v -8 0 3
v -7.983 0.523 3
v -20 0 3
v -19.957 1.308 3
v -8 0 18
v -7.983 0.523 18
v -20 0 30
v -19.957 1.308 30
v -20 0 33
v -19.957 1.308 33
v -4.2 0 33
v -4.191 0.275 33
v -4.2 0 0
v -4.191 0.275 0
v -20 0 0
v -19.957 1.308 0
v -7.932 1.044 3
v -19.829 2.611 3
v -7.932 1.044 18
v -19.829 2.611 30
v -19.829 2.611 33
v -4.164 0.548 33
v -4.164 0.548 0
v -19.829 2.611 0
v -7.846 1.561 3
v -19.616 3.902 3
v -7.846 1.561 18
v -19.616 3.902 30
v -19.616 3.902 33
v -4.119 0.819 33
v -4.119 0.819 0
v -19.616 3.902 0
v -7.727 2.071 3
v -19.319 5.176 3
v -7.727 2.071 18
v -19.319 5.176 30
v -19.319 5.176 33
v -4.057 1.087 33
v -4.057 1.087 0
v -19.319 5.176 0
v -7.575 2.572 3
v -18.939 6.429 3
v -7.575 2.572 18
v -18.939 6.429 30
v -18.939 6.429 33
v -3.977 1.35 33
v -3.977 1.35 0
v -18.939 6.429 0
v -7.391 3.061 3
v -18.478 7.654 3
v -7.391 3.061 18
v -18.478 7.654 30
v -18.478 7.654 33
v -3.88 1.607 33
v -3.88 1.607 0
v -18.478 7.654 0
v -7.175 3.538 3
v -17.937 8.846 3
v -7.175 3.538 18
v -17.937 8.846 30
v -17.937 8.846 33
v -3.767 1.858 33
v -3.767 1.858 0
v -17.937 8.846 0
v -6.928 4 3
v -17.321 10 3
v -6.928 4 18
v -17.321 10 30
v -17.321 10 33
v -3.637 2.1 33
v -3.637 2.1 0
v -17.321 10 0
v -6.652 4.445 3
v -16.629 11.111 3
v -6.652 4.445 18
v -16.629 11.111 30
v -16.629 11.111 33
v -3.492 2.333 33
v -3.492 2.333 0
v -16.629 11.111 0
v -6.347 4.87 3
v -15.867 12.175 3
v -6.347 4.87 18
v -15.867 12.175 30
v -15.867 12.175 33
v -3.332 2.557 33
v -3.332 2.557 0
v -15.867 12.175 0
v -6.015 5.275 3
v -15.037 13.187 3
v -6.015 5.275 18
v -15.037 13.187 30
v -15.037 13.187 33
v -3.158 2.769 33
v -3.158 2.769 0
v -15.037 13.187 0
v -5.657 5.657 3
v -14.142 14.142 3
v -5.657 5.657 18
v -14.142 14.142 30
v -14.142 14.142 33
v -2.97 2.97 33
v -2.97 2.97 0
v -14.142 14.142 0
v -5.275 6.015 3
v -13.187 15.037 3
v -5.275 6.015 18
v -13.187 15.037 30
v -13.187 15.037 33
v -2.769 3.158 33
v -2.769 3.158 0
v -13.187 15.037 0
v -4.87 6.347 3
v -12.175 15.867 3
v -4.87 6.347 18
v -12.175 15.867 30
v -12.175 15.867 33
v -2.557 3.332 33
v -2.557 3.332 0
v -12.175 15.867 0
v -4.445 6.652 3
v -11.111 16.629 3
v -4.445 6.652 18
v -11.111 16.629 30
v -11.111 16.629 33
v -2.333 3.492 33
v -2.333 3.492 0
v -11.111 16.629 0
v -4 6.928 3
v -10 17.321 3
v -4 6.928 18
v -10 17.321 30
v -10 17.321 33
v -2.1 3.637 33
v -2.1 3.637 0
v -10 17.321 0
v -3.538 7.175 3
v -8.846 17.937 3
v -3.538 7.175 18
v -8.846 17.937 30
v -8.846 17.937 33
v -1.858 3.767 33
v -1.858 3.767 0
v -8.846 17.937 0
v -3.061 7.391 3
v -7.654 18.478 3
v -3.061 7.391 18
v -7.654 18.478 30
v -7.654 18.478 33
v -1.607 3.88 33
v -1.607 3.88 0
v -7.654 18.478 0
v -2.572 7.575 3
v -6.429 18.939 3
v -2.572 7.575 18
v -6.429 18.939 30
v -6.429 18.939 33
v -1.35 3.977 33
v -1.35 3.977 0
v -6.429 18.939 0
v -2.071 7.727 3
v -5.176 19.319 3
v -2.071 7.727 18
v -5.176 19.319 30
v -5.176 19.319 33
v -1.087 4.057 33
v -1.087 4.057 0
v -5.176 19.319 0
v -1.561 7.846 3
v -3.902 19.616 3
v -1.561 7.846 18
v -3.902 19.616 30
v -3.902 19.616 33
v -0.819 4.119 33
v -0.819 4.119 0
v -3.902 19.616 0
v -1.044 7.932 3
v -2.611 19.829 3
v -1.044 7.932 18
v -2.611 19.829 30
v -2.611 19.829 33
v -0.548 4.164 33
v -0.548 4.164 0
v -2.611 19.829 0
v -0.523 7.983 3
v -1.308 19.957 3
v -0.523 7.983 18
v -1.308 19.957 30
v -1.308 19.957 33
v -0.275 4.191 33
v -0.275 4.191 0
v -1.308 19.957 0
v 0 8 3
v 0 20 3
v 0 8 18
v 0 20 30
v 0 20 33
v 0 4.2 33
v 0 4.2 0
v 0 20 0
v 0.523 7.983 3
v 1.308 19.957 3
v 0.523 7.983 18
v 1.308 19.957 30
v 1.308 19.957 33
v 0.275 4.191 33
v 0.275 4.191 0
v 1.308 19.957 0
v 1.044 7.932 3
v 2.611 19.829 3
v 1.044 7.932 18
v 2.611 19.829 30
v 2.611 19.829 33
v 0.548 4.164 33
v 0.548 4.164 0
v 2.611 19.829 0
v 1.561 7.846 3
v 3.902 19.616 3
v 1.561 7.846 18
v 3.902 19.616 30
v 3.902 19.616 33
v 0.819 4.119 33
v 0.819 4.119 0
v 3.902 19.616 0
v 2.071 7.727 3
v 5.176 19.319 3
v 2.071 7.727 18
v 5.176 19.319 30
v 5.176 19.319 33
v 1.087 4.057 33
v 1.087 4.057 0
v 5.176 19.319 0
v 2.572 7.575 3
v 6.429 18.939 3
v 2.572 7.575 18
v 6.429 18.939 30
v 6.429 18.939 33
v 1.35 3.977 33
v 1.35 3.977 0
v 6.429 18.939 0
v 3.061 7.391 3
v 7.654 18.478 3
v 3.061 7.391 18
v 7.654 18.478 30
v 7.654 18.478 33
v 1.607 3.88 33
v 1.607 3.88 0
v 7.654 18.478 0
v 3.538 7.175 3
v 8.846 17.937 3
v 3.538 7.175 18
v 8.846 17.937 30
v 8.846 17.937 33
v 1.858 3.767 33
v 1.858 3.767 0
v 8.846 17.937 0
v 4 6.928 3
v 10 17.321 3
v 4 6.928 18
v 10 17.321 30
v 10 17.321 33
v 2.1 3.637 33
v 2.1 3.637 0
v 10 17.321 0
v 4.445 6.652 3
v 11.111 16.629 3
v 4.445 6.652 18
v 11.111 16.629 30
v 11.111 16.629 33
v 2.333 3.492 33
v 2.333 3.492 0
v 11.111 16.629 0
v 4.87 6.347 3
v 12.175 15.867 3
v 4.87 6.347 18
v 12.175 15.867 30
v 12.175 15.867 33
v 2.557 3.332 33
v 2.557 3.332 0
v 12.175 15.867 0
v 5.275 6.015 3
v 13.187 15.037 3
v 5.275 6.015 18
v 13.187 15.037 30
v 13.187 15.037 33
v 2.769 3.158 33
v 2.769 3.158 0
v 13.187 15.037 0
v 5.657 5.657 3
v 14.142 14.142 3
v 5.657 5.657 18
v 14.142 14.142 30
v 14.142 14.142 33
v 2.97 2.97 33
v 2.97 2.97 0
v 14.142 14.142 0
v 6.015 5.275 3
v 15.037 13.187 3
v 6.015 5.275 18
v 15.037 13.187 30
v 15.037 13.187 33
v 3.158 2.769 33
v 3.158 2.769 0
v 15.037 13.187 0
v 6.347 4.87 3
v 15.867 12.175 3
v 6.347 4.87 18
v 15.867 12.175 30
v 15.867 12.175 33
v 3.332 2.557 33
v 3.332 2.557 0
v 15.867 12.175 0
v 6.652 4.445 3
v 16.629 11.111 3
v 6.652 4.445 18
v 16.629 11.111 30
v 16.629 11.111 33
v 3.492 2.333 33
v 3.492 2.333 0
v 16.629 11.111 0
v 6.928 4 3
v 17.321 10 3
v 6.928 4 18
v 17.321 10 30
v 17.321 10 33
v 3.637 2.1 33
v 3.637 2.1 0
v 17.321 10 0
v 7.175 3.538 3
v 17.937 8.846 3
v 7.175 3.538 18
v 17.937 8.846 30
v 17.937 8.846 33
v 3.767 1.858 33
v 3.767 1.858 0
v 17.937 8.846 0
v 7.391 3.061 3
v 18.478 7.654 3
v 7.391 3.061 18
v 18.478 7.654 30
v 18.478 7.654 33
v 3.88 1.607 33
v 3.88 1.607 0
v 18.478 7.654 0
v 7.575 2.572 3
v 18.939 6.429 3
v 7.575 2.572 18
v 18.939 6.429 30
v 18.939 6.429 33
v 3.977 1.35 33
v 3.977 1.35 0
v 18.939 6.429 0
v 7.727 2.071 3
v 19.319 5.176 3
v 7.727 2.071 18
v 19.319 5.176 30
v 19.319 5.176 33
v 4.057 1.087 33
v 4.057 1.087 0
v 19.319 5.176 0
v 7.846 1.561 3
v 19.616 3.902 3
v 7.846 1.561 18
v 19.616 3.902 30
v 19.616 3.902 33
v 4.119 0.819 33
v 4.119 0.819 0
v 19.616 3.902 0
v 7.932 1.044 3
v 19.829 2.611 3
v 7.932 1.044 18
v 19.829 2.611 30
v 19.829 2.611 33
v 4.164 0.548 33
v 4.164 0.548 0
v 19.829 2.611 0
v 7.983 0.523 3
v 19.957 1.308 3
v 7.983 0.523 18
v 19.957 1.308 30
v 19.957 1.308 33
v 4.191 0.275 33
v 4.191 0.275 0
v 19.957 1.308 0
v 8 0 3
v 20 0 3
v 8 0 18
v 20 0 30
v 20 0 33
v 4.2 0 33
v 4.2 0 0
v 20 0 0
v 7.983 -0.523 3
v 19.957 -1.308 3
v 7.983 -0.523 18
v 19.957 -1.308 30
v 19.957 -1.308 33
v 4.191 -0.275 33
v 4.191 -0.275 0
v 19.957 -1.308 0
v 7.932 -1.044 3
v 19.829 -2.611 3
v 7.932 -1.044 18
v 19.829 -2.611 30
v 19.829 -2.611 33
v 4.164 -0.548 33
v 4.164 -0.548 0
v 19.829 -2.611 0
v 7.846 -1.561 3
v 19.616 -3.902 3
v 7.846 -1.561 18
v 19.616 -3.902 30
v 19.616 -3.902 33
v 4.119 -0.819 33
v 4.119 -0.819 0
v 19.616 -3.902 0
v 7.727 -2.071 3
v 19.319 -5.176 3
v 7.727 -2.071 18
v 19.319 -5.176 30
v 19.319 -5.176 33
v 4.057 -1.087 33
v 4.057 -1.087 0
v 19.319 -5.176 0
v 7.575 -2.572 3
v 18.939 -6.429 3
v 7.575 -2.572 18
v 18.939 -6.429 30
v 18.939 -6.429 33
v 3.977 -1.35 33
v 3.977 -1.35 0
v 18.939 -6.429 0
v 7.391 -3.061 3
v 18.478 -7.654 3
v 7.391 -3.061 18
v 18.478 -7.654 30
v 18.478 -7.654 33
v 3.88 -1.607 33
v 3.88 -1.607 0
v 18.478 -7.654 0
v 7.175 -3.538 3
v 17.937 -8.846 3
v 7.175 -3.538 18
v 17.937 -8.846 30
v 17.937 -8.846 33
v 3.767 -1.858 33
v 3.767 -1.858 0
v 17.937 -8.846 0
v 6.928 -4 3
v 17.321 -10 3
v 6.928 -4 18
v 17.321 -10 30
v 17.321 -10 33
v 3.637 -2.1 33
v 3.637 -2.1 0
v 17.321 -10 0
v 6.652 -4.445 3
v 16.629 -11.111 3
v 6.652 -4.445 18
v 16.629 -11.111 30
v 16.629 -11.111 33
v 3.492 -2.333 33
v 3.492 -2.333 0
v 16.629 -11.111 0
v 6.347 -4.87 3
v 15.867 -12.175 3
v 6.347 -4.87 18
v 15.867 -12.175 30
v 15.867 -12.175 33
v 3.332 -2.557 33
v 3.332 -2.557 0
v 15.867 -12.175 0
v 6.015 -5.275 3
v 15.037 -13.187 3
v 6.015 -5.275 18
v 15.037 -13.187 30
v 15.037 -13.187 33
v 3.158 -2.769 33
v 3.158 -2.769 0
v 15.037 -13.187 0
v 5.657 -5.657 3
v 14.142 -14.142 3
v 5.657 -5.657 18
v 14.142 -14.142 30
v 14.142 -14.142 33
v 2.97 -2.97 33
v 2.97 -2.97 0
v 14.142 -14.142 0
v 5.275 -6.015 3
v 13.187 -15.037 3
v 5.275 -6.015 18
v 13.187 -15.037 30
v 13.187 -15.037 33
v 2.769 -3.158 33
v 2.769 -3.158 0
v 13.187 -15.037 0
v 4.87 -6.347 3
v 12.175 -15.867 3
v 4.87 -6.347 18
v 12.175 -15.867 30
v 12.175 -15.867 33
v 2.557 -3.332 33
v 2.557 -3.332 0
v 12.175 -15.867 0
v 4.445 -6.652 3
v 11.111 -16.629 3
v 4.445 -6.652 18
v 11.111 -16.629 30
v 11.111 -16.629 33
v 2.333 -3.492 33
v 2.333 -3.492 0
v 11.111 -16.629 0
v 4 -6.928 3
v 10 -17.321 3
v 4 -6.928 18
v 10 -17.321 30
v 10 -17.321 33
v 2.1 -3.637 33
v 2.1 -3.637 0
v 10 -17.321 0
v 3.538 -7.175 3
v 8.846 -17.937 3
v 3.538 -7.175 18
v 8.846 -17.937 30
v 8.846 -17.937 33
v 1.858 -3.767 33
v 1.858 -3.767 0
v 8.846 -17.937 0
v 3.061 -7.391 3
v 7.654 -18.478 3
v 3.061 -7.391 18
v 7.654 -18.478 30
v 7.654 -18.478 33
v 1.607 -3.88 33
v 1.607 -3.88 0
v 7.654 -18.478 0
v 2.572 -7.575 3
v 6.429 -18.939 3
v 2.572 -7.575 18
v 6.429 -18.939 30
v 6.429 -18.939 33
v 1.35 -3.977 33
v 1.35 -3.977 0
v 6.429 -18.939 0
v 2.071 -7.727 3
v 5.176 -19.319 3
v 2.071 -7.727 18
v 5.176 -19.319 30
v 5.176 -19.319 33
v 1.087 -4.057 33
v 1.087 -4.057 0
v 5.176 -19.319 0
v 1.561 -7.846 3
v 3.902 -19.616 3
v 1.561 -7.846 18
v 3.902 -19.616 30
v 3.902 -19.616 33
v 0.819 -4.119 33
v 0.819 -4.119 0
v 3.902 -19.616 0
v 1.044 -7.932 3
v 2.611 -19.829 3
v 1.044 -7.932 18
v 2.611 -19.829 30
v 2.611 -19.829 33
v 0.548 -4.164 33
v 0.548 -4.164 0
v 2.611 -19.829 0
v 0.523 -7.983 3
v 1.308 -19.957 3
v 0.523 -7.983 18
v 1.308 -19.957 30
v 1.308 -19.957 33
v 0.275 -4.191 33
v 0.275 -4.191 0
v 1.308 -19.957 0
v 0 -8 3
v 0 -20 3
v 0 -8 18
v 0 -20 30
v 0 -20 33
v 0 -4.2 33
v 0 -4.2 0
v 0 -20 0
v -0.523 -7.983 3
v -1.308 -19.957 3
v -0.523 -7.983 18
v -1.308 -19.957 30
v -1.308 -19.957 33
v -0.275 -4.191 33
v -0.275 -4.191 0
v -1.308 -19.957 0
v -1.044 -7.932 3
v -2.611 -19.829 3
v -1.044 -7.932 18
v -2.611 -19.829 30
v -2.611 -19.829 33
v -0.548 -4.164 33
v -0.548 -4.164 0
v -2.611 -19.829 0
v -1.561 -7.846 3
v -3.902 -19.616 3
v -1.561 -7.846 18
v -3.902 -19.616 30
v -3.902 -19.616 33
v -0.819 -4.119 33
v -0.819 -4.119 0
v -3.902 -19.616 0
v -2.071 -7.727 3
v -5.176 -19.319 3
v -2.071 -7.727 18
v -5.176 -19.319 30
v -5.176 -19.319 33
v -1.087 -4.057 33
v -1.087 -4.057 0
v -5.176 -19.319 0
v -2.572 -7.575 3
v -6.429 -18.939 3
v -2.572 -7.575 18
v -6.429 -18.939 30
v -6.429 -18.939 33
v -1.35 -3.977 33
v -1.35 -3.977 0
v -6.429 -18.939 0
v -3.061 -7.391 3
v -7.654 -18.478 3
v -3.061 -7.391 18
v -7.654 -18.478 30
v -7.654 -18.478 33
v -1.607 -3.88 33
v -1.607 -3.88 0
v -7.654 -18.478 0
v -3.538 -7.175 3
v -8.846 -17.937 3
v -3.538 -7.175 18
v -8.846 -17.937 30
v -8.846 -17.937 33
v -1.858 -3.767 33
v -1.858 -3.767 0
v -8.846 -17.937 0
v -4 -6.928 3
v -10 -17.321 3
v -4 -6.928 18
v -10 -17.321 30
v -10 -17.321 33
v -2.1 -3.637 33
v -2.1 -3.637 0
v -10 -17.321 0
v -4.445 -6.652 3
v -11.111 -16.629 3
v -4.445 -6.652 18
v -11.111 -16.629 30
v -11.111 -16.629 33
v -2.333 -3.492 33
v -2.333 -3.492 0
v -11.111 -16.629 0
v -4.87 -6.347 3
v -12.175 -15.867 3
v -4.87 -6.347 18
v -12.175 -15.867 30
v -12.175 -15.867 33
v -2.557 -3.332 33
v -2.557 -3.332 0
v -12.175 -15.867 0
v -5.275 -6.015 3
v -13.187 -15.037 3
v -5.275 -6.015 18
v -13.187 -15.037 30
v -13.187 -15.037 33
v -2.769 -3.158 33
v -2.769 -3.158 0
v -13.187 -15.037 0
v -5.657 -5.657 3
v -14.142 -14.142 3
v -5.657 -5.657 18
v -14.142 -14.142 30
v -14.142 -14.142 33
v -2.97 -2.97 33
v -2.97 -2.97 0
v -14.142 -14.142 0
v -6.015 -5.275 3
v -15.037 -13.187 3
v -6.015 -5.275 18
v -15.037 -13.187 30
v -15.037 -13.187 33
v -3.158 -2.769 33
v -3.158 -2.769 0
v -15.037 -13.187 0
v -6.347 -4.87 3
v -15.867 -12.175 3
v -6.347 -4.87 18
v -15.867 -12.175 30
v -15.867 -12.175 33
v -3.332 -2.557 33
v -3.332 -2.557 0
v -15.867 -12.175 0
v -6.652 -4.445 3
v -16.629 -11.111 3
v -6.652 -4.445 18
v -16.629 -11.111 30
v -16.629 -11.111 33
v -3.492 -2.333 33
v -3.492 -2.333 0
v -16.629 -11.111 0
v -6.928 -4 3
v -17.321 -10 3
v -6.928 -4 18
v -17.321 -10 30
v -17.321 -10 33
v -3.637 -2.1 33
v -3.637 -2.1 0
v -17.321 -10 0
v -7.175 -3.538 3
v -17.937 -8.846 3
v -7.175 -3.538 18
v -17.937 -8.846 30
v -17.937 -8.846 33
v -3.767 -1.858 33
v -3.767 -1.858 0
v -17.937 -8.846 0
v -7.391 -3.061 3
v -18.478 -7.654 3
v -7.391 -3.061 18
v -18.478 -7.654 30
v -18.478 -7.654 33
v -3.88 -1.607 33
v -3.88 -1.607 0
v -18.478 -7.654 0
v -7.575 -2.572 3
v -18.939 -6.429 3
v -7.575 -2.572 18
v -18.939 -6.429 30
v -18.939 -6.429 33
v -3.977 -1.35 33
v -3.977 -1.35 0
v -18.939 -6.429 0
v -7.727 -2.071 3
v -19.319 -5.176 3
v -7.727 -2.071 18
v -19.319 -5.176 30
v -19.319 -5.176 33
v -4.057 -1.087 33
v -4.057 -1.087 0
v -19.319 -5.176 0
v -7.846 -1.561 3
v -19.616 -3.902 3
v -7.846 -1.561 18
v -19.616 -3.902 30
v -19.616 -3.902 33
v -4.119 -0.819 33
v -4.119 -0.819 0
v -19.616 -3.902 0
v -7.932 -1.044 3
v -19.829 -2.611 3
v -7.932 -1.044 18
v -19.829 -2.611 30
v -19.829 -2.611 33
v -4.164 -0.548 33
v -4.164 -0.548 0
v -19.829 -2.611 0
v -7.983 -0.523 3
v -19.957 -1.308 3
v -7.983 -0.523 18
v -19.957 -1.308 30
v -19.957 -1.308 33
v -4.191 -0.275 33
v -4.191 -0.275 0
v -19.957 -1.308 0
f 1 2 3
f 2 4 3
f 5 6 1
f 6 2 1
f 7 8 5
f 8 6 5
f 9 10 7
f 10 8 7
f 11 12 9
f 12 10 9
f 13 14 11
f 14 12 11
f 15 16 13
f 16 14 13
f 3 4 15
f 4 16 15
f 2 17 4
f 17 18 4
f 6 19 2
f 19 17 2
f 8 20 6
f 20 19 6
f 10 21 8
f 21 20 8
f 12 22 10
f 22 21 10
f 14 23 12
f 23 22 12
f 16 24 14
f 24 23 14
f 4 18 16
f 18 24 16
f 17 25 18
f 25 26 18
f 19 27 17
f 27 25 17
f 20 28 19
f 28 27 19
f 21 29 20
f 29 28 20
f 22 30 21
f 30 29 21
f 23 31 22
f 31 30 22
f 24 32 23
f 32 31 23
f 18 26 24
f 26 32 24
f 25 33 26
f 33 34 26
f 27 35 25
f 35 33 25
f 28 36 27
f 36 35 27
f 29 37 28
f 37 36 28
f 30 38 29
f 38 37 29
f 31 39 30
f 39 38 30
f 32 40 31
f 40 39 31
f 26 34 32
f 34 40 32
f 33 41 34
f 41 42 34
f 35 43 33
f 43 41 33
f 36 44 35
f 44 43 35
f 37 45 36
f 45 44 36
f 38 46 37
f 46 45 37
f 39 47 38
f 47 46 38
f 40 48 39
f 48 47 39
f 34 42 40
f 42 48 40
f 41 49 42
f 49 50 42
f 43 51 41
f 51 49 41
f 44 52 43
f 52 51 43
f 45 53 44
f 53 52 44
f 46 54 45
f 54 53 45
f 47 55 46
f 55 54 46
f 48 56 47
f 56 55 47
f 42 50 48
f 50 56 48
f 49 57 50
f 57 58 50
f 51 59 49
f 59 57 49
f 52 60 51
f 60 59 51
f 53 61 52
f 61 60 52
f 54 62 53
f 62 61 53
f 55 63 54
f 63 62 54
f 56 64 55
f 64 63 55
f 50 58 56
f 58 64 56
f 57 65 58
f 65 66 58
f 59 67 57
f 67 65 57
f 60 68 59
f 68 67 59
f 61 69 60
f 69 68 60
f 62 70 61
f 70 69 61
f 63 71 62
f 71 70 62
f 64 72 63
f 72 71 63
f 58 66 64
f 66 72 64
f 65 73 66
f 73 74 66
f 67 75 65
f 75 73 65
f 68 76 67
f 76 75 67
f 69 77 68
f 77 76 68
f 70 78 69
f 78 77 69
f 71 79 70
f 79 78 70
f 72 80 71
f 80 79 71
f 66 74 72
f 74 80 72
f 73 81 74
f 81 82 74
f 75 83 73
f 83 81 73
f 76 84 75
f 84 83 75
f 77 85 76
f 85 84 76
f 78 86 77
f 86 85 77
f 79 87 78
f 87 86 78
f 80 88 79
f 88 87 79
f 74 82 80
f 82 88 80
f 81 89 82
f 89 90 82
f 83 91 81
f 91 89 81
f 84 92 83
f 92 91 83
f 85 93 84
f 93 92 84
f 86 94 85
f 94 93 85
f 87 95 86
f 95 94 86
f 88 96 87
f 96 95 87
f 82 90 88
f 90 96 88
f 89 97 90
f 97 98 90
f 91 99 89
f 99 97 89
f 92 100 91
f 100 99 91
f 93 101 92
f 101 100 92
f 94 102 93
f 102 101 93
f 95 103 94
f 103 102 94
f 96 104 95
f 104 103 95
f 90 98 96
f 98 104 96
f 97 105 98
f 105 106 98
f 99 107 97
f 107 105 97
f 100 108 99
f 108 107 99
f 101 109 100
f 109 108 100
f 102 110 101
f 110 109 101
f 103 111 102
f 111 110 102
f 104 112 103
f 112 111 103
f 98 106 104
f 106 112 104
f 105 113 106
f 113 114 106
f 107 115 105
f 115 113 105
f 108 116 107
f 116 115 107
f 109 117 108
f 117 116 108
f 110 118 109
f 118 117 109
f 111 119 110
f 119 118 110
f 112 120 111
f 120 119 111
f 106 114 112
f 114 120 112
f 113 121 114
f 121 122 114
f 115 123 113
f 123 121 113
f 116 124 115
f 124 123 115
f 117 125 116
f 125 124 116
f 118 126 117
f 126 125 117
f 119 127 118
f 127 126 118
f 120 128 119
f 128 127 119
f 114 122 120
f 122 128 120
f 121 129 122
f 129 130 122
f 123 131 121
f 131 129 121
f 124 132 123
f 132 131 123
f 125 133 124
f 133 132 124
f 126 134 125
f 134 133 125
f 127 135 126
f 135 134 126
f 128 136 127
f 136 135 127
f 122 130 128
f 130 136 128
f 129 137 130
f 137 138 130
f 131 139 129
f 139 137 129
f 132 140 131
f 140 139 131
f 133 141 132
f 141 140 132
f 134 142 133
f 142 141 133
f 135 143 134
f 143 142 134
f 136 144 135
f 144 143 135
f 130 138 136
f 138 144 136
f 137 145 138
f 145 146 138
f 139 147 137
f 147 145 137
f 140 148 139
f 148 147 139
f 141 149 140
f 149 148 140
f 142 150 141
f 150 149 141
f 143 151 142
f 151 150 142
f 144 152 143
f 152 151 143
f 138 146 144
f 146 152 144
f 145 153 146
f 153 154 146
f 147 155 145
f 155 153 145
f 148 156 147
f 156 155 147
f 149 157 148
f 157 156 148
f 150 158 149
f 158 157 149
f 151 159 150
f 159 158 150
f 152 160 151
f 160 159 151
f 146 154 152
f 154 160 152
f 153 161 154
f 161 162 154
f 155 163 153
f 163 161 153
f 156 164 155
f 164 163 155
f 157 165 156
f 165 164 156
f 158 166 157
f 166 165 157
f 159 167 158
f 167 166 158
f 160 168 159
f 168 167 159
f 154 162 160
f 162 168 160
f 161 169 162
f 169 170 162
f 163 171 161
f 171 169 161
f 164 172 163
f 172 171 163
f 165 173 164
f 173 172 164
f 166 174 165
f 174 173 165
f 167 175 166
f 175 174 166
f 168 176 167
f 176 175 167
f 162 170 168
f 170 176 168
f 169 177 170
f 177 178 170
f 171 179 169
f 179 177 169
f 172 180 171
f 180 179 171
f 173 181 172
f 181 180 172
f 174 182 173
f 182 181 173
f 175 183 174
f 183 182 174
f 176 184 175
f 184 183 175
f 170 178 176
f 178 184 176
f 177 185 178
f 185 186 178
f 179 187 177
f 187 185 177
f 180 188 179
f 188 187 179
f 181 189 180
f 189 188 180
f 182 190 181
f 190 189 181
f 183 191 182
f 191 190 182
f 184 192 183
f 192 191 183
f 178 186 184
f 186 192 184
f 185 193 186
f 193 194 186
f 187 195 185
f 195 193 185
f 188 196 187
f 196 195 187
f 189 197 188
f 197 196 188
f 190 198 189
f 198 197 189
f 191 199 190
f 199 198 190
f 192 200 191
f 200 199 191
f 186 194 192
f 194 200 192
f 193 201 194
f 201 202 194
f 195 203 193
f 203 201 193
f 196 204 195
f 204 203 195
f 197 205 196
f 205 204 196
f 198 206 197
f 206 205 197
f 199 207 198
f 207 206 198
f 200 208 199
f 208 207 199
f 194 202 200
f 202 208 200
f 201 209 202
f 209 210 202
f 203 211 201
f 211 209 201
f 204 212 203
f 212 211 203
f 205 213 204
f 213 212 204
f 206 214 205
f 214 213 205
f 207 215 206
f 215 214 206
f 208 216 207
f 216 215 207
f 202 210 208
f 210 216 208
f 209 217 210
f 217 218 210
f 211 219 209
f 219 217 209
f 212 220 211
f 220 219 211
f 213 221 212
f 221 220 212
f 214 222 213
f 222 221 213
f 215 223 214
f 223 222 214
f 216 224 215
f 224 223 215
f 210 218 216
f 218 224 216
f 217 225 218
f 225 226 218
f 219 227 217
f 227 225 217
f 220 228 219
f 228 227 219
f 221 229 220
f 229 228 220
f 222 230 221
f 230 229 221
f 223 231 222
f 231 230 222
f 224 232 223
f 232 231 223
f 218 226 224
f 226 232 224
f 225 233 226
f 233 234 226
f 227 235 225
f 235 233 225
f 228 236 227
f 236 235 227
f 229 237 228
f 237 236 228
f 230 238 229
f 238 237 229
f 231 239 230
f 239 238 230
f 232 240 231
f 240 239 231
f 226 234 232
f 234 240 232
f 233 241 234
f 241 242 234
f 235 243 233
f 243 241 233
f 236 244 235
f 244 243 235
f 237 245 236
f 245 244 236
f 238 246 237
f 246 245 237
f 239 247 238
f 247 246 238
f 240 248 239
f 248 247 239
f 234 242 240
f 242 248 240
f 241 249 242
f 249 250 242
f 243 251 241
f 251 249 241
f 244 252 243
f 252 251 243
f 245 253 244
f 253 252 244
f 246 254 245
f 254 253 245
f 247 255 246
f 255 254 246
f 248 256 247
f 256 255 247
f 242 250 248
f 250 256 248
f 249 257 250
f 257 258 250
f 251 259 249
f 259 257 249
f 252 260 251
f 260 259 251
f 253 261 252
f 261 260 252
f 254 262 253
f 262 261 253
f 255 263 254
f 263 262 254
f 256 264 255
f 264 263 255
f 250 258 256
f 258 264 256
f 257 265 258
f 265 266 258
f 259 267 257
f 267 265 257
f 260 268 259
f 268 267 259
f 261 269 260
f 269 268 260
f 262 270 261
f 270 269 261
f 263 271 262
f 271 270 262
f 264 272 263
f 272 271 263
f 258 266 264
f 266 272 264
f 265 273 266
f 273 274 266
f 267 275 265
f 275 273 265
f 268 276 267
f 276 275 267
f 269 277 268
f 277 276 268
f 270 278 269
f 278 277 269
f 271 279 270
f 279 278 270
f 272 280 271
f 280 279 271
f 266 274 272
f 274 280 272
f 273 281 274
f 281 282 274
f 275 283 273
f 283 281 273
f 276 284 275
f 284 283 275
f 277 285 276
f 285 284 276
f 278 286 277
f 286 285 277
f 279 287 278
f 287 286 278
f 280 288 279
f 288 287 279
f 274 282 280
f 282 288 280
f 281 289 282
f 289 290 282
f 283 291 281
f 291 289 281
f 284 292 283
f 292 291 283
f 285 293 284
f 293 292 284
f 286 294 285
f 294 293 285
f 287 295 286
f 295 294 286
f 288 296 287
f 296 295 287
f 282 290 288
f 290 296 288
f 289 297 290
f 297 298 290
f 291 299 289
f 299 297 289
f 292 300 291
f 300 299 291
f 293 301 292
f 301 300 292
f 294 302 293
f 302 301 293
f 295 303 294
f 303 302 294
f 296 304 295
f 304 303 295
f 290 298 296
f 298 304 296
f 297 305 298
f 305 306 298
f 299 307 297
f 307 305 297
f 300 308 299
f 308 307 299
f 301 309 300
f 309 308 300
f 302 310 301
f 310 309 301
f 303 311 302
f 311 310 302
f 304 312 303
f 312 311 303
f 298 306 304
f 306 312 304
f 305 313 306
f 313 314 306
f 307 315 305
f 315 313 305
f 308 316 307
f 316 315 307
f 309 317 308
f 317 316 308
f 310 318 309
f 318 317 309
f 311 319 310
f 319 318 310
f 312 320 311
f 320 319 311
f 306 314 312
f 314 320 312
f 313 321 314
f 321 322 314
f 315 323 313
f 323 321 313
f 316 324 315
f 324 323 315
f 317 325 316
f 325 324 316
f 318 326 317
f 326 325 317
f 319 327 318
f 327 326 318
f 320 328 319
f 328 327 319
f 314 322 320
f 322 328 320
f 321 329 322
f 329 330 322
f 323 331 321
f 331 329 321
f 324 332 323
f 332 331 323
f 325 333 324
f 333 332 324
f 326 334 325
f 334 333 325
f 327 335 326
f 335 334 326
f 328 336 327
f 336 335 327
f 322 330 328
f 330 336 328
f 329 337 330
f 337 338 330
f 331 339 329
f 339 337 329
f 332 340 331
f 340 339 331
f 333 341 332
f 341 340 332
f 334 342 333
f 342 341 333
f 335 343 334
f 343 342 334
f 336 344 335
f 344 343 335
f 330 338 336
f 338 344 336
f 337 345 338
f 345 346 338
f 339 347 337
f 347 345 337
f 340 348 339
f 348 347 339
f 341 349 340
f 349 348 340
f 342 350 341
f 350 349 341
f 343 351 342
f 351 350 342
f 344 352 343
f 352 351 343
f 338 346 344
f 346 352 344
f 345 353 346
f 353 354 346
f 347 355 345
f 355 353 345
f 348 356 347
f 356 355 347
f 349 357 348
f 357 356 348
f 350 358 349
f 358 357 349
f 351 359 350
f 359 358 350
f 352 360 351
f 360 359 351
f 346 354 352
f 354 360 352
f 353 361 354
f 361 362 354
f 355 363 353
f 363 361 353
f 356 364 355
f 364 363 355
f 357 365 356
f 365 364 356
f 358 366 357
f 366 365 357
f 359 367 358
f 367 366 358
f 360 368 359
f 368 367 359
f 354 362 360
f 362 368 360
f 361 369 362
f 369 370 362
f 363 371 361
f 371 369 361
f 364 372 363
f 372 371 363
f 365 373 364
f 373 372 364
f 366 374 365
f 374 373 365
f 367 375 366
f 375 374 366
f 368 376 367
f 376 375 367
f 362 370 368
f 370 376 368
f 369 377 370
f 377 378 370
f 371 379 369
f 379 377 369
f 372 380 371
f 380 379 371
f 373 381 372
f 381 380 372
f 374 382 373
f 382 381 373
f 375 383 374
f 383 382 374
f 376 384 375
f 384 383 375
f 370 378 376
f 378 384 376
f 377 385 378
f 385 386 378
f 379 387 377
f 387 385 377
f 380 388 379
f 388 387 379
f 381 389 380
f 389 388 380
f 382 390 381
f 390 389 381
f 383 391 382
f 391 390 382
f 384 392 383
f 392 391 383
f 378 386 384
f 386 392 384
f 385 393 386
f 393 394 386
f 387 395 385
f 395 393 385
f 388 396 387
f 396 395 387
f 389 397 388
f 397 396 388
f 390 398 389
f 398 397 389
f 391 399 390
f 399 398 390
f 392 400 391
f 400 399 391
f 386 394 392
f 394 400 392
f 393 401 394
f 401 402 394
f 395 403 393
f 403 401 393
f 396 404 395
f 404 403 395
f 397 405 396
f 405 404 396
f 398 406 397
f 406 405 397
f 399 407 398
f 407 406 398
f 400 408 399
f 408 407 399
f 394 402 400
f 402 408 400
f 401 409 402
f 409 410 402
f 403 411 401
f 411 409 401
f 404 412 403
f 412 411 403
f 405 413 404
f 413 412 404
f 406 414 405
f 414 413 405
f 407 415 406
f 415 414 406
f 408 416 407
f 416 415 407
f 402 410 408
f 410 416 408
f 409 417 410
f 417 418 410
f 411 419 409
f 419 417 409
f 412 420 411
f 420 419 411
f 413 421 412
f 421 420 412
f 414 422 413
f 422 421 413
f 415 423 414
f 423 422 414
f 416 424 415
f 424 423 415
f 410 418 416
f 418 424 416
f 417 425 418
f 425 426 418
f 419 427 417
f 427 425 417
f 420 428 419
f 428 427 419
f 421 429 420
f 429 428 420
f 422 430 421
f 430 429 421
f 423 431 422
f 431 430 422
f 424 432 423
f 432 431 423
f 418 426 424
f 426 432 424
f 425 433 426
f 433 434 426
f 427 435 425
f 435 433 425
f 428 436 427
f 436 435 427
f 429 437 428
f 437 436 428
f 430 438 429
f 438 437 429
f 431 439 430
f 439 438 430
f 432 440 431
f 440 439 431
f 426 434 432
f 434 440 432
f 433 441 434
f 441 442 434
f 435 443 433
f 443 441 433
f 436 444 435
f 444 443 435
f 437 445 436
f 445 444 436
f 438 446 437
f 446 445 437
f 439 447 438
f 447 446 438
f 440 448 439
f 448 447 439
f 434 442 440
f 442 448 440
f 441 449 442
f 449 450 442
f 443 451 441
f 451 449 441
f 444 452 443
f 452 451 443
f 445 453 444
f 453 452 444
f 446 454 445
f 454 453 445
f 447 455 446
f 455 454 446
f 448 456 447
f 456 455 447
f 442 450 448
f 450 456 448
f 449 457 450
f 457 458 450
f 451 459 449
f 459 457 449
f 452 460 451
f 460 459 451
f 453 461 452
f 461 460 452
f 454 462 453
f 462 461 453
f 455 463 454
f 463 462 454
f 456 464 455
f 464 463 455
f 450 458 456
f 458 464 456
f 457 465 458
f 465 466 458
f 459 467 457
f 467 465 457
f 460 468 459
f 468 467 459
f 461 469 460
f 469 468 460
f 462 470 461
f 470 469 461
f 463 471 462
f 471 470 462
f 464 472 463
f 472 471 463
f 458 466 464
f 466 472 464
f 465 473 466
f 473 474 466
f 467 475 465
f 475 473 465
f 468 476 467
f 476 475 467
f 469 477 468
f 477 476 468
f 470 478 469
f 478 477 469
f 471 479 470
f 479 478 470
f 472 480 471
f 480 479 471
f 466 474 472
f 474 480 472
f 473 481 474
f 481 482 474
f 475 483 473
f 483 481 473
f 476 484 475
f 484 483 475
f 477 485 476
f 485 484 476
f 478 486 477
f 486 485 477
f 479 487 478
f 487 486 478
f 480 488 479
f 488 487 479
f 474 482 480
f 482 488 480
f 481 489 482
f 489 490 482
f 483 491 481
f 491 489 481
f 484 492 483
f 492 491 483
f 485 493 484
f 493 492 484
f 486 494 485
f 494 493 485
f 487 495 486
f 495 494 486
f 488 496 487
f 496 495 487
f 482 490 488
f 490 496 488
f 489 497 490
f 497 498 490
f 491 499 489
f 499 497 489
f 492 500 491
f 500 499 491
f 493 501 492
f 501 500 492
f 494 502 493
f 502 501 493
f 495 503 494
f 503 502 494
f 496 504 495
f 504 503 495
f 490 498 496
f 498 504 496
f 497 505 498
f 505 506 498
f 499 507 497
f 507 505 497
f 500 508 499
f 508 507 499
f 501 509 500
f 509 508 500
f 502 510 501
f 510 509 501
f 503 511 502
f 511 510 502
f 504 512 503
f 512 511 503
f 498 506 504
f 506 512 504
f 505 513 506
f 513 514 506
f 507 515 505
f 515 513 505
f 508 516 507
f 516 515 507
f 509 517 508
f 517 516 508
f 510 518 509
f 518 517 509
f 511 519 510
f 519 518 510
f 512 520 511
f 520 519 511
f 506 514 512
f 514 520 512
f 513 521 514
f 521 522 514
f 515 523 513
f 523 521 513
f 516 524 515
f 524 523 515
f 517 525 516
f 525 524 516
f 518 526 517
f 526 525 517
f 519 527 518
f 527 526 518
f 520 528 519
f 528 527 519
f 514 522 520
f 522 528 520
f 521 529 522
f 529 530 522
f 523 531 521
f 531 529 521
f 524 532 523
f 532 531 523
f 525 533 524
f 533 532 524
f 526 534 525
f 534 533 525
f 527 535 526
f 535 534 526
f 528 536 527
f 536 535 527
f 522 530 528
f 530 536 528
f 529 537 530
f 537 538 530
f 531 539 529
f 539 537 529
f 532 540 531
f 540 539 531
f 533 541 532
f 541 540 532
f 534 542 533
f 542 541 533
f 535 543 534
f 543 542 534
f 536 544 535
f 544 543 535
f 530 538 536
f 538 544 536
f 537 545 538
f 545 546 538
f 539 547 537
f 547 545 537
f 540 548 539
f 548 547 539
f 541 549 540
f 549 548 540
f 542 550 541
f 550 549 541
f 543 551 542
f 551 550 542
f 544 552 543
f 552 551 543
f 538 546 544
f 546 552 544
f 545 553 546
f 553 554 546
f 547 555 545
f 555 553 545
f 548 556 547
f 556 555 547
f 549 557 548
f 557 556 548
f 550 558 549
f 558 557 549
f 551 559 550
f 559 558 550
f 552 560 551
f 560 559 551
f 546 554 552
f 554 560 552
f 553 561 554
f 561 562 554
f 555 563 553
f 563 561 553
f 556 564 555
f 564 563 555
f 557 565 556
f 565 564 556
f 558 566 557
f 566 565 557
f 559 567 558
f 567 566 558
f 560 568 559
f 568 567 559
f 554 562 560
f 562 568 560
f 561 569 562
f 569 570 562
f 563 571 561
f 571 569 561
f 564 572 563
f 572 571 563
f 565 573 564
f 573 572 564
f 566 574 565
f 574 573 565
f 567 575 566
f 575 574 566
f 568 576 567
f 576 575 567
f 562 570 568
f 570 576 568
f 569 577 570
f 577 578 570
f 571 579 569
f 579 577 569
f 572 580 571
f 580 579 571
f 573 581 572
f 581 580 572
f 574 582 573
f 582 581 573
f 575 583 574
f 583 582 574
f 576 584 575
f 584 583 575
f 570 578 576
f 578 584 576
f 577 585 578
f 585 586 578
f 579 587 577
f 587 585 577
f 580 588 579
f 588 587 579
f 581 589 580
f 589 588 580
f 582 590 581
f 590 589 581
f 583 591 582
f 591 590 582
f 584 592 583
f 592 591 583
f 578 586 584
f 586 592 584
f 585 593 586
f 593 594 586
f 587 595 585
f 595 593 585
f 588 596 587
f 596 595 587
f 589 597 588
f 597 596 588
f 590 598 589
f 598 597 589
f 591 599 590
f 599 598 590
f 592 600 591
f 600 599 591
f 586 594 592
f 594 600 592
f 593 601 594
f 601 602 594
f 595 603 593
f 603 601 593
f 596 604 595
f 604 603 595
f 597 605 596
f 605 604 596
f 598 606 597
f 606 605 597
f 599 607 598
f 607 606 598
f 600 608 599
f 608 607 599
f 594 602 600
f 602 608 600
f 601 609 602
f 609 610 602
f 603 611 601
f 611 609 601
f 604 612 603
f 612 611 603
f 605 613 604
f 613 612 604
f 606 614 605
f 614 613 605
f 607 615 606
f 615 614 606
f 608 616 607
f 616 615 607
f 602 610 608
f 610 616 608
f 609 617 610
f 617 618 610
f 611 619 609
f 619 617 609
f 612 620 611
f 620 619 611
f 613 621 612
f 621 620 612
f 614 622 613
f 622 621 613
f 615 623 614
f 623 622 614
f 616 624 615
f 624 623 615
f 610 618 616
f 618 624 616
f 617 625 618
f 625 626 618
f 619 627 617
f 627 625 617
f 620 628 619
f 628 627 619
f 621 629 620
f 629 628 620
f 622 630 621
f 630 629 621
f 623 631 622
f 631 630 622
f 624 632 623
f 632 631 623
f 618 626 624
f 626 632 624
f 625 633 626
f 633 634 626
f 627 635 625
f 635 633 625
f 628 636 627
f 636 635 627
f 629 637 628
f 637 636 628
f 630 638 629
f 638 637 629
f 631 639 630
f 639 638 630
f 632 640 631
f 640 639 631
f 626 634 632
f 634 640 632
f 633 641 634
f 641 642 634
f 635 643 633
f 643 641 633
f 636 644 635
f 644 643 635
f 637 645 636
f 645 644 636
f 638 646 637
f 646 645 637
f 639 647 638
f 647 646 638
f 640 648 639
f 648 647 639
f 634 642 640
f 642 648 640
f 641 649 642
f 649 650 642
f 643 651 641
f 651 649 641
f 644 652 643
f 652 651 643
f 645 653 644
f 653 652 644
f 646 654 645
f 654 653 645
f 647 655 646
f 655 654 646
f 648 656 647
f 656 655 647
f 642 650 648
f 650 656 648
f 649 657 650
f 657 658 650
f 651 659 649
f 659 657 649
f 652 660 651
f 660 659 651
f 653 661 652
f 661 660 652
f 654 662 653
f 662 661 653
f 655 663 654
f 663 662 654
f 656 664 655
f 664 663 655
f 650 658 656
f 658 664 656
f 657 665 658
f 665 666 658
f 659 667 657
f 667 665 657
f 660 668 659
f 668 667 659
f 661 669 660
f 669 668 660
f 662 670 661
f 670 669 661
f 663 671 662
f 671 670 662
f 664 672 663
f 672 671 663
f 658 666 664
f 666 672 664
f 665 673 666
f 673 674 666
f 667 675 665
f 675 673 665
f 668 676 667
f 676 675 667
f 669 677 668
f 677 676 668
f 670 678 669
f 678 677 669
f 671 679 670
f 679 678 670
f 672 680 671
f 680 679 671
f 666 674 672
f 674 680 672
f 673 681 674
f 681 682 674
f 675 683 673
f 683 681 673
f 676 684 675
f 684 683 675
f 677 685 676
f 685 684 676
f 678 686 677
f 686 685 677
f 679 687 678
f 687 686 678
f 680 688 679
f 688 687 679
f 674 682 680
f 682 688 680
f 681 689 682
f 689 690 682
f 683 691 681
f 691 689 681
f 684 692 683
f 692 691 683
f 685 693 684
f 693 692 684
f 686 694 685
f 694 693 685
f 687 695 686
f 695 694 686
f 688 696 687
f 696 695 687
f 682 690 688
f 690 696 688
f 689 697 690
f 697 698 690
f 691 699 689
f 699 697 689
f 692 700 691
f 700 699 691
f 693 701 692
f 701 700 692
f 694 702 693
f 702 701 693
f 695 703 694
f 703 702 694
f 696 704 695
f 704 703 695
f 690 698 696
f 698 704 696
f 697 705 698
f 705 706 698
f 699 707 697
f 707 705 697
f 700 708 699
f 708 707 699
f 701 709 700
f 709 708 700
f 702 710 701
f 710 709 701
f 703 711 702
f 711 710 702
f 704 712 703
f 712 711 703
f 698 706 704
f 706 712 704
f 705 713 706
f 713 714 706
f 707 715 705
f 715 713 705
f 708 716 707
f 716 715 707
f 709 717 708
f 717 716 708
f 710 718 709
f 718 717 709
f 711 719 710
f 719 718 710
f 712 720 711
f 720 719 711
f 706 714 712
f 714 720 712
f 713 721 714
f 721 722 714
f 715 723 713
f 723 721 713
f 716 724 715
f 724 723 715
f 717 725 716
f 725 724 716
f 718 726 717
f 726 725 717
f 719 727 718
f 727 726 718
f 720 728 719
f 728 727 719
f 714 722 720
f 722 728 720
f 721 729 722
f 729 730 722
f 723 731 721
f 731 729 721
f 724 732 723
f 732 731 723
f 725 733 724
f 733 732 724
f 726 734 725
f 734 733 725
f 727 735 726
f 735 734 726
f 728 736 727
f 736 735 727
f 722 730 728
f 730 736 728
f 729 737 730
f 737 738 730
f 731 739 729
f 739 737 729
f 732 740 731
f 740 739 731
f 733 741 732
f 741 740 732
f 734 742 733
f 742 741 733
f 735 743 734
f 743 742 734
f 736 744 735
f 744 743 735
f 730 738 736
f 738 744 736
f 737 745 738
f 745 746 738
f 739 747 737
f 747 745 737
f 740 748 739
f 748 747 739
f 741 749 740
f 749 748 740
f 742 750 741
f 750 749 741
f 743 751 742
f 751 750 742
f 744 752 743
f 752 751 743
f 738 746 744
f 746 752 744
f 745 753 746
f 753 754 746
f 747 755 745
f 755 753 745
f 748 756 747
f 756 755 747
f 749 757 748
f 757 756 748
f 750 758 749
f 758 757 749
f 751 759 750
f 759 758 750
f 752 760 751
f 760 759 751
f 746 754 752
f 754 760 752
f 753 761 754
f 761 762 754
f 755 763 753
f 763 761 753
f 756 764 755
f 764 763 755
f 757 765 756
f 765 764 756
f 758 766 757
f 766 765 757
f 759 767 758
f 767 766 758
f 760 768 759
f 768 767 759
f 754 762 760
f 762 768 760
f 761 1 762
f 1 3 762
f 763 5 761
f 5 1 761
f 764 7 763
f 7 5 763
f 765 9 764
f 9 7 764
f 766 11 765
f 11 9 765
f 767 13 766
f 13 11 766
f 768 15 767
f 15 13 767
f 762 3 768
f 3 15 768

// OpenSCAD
// ATLAS FORGE original continuity-tutorial geometry v0.1.0
// Units: millimeters. Nonstructural coil former, low-voltage experiments only.
// IMPORTANT: Solid CAD is NOT printer-specific G-code or manufactured qualification.
$fn=96;
rotate_extrude(convexity=10,$fn=96)
  polygon(points=[
    [4.2000,0.0000],
    [20.0000,0.0000],
    [20.0000,3.0000],
    [8.0000,3.0000],
    [8.0000,18.0000],
    [20.0000,30.0000],
    [20.0000,33.0000],
    [4.2000,33.0000]
  ]);
